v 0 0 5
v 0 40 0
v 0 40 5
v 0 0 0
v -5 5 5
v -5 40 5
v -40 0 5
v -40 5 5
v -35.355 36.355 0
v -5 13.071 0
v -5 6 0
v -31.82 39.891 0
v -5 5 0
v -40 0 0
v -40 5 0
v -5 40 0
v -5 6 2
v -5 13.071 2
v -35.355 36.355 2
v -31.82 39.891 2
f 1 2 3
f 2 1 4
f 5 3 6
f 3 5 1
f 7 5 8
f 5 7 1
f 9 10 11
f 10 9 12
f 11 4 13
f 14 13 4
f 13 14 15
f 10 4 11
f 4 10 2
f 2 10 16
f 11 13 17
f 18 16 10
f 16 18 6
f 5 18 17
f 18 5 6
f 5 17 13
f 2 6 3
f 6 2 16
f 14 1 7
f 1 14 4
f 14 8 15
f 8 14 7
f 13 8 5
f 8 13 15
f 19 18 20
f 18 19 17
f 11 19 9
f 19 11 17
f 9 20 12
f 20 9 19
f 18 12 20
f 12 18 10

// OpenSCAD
//!OpenSCAD
//thickness of the blocks
side_width = 5;
//defines the height of the two axis
Height = 5;
//defines the length of the other two axis
length2 = 40;
//length of the center finder main axis
center_length = 50;
// difines the offset you need to mark a line
offset_pencil = 1;

difference() {
  union(){
    translate([(side_width * -1), 0, 0]){
      cube([side_width, length2, Height], center=false);
    }
    translate([0,0,0]){
    rotate([0, 0, 90]){
      cube([side_width, length2, Height], center=false);
    }
    }
    translate([0,offset_pencil,0]){
    rotate([0, 0, 45]){
      cube([side_width, center_length, 2], center=false);
    }
}
  }

  cube([side_width, length2, Height], center=false);
}
